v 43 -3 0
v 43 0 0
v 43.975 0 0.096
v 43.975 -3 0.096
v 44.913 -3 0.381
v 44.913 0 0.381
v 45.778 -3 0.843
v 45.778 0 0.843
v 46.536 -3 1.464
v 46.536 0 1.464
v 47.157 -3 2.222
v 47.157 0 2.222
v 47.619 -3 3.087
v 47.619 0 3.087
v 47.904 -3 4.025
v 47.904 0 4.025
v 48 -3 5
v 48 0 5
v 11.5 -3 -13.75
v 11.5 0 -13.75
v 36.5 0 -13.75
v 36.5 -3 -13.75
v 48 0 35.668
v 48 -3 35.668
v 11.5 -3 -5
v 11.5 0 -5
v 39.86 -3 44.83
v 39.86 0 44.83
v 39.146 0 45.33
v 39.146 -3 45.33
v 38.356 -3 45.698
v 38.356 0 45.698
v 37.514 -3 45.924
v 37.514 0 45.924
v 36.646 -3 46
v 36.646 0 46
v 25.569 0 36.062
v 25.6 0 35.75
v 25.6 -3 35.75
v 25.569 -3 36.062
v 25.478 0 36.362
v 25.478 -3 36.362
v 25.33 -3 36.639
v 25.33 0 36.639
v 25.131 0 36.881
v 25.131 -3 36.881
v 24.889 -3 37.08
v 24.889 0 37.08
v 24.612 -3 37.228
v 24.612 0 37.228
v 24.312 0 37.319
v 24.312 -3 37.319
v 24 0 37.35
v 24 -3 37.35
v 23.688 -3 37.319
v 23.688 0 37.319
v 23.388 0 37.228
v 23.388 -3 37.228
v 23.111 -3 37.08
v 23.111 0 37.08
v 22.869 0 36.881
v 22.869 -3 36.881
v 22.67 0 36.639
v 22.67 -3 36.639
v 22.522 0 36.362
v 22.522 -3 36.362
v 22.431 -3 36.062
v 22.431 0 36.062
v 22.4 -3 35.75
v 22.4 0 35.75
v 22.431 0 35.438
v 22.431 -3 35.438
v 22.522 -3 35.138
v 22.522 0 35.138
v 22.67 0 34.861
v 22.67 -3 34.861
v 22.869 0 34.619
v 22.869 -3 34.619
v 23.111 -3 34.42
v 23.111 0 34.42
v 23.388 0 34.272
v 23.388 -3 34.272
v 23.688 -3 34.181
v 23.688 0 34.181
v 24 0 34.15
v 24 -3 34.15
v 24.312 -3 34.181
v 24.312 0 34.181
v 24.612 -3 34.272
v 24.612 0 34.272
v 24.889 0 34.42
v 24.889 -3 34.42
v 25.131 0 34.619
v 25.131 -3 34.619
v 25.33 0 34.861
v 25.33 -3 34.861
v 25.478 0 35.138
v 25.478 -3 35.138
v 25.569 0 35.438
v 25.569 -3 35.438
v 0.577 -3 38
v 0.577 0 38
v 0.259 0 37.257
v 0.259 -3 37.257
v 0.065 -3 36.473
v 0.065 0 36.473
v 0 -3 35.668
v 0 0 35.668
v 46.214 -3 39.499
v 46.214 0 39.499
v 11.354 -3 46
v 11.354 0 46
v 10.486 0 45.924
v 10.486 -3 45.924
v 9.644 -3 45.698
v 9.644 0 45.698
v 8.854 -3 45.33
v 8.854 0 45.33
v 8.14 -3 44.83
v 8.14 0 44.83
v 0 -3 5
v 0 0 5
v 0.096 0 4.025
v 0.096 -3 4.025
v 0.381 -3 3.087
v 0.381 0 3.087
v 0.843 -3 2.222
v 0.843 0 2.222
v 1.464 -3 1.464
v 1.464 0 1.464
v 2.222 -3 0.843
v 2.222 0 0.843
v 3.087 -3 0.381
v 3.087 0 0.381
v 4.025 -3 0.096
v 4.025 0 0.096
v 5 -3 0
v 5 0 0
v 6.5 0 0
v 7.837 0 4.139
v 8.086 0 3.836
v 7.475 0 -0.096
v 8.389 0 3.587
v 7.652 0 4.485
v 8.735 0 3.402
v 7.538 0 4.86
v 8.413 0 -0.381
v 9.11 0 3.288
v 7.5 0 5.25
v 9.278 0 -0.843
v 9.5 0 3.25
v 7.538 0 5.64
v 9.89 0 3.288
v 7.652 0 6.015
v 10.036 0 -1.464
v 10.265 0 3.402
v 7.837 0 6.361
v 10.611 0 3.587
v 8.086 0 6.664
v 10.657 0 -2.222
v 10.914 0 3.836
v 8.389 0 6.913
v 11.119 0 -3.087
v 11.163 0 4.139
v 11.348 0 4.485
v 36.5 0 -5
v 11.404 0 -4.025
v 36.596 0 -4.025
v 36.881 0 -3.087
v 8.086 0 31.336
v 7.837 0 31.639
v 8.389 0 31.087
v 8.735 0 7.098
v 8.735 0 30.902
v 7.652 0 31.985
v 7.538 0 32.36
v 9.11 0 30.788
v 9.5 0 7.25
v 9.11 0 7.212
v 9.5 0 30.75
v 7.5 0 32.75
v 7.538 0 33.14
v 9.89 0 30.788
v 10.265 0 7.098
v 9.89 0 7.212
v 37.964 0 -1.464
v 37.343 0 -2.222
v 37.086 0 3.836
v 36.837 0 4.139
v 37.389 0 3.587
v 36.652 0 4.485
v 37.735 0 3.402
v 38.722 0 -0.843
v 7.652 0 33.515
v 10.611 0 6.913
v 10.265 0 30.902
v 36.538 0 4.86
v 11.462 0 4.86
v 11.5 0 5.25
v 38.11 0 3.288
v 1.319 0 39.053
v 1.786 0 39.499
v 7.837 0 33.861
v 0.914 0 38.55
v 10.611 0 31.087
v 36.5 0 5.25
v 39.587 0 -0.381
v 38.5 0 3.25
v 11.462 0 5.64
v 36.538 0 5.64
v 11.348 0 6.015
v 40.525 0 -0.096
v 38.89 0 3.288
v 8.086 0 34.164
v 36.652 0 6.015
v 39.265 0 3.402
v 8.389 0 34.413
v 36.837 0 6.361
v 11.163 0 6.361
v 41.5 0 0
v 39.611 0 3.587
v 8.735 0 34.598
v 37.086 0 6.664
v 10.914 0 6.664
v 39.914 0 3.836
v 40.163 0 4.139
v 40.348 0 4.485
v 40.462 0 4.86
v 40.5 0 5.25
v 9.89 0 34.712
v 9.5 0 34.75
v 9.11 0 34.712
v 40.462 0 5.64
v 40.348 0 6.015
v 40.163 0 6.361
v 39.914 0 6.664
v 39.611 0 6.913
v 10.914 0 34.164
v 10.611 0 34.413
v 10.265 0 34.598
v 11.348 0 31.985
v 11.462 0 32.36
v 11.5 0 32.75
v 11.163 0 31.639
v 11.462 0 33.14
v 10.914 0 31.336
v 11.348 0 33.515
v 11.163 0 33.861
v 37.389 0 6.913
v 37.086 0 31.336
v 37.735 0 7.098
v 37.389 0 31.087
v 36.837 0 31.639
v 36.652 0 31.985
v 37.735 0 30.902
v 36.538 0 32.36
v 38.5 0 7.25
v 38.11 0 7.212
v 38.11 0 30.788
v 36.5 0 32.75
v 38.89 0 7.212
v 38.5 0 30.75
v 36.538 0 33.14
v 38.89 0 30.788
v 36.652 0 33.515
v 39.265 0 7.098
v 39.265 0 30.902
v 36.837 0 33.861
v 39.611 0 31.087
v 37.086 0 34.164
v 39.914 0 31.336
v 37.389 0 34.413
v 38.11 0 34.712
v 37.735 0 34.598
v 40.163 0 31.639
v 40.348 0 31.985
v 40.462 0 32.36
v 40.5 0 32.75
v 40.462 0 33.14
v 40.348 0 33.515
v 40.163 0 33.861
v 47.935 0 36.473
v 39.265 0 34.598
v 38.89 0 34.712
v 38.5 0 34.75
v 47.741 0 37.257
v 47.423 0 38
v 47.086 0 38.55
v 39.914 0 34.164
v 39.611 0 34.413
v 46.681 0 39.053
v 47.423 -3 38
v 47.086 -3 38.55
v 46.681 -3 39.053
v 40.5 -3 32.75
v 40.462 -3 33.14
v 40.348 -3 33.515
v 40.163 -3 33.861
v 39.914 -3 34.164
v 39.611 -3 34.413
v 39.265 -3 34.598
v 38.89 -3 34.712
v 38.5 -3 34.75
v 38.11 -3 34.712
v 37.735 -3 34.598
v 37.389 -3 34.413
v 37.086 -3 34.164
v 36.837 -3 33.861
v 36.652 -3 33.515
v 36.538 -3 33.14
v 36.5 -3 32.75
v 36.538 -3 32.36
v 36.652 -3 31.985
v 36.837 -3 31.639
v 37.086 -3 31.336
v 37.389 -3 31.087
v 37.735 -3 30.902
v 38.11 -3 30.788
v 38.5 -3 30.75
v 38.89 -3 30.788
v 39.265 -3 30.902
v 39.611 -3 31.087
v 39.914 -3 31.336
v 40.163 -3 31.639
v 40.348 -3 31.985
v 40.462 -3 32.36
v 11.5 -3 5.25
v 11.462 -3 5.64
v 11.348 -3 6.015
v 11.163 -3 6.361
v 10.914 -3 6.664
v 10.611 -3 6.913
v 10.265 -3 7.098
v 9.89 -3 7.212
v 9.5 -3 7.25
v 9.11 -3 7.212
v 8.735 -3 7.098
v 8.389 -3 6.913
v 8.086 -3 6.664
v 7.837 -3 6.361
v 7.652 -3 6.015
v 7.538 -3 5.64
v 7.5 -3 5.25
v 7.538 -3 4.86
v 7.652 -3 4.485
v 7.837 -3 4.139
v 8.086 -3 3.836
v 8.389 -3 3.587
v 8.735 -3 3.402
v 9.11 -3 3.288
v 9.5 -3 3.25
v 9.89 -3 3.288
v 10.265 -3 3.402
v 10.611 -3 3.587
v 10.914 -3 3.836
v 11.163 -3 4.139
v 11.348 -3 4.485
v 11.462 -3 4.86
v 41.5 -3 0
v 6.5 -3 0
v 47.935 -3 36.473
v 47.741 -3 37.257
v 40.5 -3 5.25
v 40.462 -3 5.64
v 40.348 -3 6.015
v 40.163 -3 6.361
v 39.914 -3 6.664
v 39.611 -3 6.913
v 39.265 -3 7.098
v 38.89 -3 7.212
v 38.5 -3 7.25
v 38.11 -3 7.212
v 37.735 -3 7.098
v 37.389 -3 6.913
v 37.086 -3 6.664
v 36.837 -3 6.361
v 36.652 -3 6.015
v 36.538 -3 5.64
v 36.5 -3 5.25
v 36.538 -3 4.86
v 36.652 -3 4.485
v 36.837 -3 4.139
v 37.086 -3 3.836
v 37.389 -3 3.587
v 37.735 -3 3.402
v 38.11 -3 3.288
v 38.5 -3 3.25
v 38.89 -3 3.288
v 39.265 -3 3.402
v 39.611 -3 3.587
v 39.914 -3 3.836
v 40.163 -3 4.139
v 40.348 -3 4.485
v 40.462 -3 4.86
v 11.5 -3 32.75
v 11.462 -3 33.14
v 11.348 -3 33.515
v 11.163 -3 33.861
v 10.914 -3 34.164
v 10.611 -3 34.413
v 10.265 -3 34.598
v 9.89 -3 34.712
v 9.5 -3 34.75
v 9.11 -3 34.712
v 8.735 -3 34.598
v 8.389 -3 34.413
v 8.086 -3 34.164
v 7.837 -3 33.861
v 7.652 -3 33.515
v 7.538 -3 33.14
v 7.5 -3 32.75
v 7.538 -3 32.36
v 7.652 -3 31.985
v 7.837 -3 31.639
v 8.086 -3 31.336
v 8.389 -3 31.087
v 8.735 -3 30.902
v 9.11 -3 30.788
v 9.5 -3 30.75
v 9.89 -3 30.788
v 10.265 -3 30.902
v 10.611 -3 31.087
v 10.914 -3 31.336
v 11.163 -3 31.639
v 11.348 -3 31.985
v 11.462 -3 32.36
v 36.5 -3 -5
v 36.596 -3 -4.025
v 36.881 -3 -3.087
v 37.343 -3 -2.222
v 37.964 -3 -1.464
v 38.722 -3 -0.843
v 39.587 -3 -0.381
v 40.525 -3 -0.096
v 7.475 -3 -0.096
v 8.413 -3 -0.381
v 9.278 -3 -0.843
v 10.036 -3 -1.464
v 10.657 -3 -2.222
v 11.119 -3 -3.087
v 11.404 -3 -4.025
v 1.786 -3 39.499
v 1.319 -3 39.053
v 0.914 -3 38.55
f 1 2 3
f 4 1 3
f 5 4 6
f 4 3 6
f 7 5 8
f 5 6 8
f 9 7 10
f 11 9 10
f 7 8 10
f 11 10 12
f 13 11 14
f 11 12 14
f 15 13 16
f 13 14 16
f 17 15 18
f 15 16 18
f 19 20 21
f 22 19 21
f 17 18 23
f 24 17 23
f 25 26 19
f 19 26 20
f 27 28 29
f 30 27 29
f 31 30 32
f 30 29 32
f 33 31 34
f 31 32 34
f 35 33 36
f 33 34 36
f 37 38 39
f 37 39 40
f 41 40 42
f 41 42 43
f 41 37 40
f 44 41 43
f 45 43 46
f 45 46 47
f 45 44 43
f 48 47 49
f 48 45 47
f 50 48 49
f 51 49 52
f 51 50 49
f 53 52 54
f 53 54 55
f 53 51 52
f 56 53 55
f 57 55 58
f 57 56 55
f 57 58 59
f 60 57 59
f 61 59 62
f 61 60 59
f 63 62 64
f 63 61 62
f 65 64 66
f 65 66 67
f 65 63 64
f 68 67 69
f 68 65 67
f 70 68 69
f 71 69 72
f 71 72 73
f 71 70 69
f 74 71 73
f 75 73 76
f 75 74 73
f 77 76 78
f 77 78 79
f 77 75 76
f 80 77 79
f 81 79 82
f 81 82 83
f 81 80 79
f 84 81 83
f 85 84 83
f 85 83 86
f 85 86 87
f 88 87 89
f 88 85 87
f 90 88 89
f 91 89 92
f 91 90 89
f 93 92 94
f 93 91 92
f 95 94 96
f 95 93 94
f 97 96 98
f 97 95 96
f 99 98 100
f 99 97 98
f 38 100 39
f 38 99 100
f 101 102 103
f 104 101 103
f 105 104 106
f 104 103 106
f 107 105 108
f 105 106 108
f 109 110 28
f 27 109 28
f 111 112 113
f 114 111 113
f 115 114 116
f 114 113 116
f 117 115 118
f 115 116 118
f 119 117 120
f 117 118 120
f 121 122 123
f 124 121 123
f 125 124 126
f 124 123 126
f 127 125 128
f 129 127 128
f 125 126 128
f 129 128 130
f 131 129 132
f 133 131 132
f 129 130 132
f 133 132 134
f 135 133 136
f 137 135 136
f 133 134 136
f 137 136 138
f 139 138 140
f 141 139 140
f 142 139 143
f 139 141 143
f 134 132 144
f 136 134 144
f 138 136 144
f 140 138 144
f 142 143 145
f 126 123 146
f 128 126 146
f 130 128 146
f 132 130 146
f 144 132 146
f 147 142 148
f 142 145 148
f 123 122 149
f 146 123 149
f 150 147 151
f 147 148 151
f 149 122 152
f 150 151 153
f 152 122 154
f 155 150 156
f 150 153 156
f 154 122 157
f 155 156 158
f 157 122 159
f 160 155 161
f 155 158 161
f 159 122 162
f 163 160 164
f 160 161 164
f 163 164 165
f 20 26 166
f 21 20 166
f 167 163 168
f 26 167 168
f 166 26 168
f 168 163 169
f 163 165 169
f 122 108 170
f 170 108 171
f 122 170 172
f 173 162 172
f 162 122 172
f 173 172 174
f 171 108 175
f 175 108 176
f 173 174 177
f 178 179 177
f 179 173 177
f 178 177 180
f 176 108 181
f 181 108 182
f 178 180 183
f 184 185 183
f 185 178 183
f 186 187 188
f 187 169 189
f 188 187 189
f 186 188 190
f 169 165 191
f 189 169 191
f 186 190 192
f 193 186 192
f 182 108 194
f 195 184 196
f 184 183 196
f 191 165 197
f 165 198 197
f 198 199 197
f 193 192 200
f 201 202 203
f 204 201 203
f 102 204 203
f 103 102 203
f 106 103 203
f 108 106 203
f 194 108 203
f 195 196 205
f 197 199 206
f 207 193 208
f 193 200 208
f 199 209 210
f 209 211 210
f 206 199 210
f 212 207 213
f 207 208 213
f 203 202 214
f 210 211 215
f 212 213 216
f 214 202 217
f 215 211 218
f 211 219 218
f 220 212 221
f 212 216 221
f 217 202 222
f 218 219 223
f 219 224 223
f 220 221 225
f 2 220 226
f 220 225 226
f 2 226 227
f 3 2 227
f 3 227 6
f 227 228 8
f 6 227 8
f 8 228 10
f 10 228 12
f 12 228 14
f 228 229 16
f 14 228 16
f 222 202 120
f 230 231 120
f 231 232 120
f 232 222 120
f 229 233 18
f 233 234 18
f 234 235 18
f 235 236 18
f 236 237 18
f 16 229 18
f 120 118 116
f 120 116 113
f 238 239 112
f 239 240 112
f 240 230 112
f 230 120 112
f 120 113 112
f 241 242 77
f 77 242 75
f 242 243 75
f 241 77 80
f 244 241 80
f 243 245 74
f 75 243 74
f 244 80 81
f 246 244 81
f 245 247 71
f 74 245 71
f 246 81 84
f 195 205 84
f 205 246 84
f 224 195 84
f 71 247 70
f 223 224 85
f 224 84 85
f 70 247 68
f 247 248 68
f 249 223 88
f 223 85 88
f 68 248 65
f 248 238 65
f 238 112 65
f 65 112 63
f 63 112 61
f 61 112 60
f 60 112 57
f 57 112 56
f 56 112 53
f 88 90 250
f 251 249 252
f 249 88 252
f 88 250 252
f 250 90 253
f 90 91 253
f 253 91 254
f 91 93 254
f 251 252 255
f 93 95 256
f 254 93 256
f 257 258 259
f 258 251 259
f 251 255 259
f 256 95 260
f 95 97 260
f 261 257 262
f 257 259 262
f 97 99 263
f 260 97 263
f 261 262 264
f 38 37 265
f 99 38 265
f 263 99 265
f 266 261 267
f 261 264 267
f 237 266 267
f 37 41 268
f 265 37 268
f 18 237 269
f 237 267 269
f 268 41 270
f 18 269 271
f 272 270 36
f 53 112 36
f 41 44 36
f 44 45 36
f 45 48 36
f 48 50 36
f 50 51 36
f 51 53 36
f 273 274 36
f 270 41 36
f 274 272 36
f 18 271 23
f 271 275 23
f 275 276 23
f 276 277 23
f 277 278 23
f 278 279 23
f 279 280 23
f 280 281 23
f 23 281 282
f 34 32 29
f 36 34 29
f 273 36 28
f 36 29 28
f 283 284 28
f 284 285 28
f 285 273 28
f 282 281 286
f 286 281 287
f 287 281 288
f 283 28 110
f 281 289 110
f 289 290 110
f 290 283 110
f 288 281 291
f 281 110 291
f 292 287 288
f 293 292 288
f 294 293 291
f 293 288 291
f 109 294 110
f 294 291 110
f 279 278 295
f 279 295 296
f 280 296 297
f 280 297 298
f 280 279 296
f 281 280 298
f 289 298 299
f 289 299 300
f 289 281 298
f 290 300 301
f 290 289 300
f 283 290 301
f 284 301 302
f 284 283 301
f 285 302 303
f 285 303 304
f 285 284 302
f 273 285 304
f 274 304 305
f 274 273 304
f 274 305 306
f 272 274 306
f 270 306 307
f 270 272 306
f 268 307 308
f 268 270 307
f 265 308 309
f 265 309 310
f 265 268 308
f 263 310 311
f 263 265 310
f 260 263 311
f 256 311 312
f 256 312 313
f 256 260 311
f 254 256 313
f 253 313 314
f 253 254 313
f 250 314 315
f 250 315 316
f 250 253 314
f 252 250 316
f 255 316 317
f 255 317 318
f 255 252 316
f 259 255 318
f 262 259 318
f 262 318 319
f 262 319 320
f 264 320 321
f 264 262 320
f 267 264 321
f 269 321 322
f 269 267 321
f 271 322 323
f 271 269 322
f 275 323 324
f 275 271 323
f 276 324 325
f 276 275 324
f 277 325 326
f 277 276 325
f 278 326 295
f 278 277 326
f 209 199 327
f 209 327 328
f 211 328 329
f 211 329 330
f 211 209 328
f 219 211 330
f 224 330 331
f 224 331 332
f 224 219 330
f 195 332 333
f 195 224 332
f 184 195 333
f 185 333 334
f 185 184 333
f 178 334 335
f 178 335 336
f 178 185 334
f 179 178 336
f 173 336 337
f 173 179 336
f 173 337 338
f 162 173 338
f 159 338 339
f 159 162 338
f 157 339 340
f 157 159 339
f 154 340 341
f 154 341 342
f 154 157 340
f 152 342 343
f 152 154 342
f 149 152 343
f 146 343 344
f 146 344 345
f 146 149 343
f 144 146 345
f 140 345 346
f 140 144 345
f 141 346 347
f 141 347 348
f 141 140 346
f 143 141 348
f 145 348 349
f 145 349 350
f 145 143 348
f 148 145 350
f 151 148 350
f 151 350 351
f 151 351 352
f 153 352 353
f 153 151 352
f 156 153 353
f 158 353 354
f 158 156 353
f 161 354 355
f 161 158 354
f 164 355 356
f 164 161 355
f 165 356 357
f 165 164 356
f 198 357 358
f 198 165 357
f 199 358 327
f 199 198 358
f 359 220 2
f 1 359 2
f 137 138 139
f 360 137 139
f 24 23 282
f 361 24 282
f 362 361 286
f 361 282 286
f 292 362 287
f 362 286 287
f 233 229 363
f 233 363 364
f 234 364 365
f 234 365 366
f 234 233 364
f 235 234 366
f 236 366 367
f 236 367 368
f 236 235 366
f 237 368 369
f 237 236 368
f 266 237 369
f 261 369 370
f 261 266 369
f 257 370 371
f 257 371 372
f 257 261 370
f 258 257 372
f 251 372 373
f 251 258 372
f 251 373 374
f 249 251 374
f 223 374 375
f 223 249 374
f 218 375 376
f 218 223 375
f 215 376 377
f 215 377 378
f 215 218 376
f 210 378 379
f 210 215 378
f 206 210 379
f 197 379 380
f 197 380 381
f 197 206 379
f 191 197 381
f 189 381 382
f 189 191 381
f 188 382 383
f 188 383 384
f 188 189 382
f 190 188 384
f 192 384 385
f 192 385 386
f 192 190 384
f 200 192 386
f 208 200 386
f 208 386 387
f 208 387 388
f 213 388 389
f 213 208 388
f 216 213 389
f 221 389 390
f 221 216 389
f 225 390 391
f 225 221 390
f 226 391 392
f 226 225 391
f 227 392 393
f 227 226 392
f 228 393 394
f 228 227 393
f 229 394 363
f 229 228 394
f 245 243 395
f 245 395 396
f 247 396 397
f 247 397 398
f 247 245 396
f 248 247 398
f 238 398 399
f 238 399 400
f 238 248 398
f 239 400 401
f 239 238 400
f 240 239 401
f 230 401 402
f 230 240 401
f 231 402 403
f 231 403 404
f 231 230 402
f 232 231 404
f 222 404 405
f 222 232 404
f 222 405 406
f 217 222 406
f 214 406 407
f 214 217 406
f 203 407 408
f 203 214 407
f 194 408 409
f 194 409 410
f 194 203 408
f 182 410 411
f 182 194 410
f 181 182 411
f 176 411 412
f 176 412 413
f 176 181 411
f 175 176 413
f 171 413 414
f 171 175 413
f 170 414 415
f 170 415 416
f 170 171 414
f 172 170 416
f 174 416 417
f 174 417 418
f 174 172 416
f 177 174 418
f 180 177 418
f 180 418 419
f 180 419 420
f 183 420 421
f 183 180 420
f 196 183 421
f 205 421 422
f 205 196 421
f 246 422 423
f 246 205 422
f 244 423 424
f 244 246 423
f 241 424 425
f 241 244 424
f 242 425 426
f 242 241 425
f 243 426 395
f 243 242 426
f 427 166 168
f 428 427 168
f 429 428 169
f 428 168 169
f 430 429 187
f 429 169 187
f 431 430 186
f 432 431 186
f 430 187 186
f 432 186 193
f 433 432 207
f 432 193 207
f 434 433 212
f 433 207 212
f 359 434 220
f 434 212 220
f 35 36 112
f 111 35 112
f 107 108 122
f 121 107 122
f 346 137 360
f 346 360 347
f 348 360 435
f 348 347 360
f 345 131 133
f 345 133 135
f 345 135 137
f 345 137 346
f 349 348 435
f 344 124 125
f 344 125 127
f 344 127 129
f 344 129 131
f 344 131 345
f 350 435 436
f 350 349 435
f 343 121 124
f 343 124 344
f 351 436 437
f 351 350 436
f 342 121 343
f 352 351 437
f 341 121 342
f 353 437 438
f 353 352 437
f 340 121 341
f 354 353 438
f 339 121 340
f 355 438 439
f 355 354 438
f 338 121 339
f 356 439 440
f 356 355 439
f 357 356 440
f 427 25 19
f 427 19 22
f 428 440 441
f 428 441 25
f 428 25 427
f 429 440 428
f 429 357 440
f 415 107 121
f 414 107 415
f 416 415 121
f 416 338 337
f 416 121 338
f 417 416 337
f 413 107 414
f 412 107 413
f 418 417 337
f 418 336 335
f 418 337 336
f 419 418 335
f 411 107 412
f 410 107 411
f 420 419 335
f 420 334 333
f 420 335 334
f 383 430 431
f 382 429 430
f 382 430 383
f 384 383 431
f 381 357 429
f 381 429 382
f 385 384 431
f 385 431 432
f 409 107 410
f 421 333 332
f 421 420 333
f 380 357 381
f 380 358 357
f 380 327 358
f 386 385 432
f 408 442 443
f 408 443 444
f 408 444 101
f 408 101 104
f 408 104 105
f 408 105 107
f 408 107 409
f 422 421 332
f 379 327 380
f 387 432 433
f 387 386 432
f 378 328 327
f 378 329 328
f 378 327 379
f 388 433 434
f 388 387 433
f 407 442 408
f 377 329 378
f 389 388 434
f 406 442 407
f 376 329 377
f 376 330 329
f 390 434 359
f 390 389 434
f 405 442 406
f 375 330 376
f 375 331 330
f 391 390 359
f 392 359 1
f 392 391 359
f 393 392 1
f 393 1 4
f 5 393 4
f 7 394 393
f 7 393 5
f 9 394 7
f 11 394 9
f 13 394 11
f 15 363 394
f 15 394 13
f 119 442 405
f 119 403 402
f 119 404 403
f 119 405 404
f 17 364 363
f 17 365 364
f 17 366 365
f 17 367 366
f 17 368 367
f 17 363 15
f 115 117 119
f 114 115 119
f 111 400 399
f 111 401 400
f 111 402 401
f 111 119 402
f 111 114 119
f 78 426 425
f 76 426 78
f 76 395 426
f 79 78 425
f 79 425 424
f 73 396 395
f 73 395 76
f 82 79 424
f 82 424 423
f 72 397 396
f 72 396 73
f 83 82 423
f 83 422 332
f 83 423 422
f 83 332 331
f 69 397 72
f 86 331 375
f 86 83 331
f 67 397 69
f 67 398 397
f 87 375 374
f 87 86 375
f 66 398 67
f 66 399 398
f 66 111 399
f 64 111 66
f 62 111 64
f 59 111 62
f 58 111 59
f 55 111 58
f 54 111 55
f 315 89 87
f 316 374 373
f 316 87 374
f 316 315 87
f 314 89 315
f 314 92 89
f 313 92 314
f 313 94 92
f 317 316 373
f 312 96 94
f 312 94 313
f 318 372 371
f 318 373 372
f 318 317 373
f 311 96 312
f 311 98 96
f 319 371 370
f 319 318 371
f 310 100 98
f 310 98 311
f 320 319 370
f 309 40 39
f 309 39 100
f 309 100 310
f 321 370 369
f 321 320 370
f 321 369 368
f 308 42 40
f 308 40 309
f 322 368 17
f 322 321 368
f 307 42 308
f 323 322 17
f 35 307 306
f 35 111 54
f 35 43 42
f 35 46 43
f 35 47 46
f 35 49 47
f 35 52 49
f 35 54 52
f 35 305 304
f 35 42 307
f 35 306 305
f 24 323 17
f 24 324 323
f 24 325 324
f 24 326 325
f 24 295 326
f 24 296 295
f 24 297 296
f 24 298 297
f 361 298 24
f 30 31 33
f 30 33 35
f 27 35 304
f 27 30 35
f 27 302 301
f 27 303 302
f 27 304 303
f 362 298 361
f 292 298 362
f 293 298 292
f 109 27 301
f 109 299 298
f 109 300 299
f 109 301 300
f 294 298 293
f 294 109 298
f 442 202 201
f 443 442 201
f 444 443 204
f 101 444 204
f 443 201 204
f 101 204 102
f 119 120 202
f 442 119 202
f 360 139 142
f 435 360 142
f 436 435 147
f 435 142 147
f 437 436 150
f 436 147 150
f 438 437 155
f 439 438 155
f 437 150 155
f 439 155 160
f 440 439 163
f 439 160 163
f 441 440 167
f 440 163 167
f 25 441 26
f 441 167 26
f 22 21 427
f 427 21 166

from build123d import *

# Parameters (mm, degrees)
F0_R     = 2
F0_R_2   = 1.6
F1_DEPTH = 3


# Not quite as in the source:
# - a feature names something its author has since deleted; it is built from what else it names


with BuildPart() as f1:
    # F0 (on Front) → F1 (new body)
    with BuildSketch(Plane.XZ):
        with BuildLine():
            ThreePointArc((1.7860619516, 39.4986839248), (1.1086440911, 38.8081032796), (0.5768869335, 38))
            Line((0.5768869335, 38), (47.4231130665, 38))
            ThreePointArc((47.4231130665, 38), (46.8913559089, 38.8081032796), (46.2139380484, 39.4986839248))
            Line((46.2139380484, 39.4986839248), (39.8600581363, 44.8302222156))
            ThreePointArc((39.8600581363, 44.8302222156), (38.3562208045, 45.6984631039), (36.6461200879, 46))
            Line((36.6461200879, 46), (11.3538799121, 46))
            ThreePointArc((11.3538799121, 46), (9.6437791955, 45.6984631039), (8.1399418637, 44.8302222156))
            Line((8.1399418637, 44.8302222156), (1.7860619516, 39.4986839248))
        make_face()
        with BuildLine():
            Line((47.4231130665, 38), (0.5768869335, 38))
            ThreePointArc((0.5768869335, 38), (0.1463639747, 36.869385243), (0, 35.6684617092))
            Line((0, 35.6684617092), (0, 5))
            ThreePointArc((0, 5), (1.4644660941, 1.4644660941), (5, 0))
            Line((5, 0), (6.5, 0))
            ThreePointArc((6.5, 0), (10.0355339059, -1.4644660941), (11.5, -5))
            Line((11.5, -5), (11.5, -5.0126606831))
            Line((11.5, -5.0126606831), (11.5, -13.75))
            Line((11.5, -13.75), (36.5, -13.75))
            Line((36.5, -13.75), (36.5, -5))
            ThreePointArc((36.5, -5), (37.9644660941, -1.4644660941), (41.5, 0))
            Line((41.5, 0), (43, 0))
            ThreePointArc((43, 0), (46.5355339059, 1.4644660941), (48, 5))
            Line((48, 5), (48, 35.6684617092))
            ThreePointArc((48, 35.6684617092), (47.8536360253, 36.869385243), (47.4231130665, 38))
        make_face()
        with Locations((9.5, 5.25)):
            Circle(F0_R, mode=Mode.SUBTRACT)
        with Locations((38.5, 5.25)):
            Circle(F0_R, mode=Mode.SUBTRACT)
        with Locations((9.5, 32.75)):
            Circle(F0_R, mode=Mode.SUBTRACT)
        with Locations((24, 35.75)):
            Circle(F0_R_2, mode=Mode.SUBTRACT)
        with Locations((38.5, 32.75)):
            Circle(F0_R, mode=Mode.SUBTRACT)
    extrude(amount=F1_DEPTH)


solid = f1.part
